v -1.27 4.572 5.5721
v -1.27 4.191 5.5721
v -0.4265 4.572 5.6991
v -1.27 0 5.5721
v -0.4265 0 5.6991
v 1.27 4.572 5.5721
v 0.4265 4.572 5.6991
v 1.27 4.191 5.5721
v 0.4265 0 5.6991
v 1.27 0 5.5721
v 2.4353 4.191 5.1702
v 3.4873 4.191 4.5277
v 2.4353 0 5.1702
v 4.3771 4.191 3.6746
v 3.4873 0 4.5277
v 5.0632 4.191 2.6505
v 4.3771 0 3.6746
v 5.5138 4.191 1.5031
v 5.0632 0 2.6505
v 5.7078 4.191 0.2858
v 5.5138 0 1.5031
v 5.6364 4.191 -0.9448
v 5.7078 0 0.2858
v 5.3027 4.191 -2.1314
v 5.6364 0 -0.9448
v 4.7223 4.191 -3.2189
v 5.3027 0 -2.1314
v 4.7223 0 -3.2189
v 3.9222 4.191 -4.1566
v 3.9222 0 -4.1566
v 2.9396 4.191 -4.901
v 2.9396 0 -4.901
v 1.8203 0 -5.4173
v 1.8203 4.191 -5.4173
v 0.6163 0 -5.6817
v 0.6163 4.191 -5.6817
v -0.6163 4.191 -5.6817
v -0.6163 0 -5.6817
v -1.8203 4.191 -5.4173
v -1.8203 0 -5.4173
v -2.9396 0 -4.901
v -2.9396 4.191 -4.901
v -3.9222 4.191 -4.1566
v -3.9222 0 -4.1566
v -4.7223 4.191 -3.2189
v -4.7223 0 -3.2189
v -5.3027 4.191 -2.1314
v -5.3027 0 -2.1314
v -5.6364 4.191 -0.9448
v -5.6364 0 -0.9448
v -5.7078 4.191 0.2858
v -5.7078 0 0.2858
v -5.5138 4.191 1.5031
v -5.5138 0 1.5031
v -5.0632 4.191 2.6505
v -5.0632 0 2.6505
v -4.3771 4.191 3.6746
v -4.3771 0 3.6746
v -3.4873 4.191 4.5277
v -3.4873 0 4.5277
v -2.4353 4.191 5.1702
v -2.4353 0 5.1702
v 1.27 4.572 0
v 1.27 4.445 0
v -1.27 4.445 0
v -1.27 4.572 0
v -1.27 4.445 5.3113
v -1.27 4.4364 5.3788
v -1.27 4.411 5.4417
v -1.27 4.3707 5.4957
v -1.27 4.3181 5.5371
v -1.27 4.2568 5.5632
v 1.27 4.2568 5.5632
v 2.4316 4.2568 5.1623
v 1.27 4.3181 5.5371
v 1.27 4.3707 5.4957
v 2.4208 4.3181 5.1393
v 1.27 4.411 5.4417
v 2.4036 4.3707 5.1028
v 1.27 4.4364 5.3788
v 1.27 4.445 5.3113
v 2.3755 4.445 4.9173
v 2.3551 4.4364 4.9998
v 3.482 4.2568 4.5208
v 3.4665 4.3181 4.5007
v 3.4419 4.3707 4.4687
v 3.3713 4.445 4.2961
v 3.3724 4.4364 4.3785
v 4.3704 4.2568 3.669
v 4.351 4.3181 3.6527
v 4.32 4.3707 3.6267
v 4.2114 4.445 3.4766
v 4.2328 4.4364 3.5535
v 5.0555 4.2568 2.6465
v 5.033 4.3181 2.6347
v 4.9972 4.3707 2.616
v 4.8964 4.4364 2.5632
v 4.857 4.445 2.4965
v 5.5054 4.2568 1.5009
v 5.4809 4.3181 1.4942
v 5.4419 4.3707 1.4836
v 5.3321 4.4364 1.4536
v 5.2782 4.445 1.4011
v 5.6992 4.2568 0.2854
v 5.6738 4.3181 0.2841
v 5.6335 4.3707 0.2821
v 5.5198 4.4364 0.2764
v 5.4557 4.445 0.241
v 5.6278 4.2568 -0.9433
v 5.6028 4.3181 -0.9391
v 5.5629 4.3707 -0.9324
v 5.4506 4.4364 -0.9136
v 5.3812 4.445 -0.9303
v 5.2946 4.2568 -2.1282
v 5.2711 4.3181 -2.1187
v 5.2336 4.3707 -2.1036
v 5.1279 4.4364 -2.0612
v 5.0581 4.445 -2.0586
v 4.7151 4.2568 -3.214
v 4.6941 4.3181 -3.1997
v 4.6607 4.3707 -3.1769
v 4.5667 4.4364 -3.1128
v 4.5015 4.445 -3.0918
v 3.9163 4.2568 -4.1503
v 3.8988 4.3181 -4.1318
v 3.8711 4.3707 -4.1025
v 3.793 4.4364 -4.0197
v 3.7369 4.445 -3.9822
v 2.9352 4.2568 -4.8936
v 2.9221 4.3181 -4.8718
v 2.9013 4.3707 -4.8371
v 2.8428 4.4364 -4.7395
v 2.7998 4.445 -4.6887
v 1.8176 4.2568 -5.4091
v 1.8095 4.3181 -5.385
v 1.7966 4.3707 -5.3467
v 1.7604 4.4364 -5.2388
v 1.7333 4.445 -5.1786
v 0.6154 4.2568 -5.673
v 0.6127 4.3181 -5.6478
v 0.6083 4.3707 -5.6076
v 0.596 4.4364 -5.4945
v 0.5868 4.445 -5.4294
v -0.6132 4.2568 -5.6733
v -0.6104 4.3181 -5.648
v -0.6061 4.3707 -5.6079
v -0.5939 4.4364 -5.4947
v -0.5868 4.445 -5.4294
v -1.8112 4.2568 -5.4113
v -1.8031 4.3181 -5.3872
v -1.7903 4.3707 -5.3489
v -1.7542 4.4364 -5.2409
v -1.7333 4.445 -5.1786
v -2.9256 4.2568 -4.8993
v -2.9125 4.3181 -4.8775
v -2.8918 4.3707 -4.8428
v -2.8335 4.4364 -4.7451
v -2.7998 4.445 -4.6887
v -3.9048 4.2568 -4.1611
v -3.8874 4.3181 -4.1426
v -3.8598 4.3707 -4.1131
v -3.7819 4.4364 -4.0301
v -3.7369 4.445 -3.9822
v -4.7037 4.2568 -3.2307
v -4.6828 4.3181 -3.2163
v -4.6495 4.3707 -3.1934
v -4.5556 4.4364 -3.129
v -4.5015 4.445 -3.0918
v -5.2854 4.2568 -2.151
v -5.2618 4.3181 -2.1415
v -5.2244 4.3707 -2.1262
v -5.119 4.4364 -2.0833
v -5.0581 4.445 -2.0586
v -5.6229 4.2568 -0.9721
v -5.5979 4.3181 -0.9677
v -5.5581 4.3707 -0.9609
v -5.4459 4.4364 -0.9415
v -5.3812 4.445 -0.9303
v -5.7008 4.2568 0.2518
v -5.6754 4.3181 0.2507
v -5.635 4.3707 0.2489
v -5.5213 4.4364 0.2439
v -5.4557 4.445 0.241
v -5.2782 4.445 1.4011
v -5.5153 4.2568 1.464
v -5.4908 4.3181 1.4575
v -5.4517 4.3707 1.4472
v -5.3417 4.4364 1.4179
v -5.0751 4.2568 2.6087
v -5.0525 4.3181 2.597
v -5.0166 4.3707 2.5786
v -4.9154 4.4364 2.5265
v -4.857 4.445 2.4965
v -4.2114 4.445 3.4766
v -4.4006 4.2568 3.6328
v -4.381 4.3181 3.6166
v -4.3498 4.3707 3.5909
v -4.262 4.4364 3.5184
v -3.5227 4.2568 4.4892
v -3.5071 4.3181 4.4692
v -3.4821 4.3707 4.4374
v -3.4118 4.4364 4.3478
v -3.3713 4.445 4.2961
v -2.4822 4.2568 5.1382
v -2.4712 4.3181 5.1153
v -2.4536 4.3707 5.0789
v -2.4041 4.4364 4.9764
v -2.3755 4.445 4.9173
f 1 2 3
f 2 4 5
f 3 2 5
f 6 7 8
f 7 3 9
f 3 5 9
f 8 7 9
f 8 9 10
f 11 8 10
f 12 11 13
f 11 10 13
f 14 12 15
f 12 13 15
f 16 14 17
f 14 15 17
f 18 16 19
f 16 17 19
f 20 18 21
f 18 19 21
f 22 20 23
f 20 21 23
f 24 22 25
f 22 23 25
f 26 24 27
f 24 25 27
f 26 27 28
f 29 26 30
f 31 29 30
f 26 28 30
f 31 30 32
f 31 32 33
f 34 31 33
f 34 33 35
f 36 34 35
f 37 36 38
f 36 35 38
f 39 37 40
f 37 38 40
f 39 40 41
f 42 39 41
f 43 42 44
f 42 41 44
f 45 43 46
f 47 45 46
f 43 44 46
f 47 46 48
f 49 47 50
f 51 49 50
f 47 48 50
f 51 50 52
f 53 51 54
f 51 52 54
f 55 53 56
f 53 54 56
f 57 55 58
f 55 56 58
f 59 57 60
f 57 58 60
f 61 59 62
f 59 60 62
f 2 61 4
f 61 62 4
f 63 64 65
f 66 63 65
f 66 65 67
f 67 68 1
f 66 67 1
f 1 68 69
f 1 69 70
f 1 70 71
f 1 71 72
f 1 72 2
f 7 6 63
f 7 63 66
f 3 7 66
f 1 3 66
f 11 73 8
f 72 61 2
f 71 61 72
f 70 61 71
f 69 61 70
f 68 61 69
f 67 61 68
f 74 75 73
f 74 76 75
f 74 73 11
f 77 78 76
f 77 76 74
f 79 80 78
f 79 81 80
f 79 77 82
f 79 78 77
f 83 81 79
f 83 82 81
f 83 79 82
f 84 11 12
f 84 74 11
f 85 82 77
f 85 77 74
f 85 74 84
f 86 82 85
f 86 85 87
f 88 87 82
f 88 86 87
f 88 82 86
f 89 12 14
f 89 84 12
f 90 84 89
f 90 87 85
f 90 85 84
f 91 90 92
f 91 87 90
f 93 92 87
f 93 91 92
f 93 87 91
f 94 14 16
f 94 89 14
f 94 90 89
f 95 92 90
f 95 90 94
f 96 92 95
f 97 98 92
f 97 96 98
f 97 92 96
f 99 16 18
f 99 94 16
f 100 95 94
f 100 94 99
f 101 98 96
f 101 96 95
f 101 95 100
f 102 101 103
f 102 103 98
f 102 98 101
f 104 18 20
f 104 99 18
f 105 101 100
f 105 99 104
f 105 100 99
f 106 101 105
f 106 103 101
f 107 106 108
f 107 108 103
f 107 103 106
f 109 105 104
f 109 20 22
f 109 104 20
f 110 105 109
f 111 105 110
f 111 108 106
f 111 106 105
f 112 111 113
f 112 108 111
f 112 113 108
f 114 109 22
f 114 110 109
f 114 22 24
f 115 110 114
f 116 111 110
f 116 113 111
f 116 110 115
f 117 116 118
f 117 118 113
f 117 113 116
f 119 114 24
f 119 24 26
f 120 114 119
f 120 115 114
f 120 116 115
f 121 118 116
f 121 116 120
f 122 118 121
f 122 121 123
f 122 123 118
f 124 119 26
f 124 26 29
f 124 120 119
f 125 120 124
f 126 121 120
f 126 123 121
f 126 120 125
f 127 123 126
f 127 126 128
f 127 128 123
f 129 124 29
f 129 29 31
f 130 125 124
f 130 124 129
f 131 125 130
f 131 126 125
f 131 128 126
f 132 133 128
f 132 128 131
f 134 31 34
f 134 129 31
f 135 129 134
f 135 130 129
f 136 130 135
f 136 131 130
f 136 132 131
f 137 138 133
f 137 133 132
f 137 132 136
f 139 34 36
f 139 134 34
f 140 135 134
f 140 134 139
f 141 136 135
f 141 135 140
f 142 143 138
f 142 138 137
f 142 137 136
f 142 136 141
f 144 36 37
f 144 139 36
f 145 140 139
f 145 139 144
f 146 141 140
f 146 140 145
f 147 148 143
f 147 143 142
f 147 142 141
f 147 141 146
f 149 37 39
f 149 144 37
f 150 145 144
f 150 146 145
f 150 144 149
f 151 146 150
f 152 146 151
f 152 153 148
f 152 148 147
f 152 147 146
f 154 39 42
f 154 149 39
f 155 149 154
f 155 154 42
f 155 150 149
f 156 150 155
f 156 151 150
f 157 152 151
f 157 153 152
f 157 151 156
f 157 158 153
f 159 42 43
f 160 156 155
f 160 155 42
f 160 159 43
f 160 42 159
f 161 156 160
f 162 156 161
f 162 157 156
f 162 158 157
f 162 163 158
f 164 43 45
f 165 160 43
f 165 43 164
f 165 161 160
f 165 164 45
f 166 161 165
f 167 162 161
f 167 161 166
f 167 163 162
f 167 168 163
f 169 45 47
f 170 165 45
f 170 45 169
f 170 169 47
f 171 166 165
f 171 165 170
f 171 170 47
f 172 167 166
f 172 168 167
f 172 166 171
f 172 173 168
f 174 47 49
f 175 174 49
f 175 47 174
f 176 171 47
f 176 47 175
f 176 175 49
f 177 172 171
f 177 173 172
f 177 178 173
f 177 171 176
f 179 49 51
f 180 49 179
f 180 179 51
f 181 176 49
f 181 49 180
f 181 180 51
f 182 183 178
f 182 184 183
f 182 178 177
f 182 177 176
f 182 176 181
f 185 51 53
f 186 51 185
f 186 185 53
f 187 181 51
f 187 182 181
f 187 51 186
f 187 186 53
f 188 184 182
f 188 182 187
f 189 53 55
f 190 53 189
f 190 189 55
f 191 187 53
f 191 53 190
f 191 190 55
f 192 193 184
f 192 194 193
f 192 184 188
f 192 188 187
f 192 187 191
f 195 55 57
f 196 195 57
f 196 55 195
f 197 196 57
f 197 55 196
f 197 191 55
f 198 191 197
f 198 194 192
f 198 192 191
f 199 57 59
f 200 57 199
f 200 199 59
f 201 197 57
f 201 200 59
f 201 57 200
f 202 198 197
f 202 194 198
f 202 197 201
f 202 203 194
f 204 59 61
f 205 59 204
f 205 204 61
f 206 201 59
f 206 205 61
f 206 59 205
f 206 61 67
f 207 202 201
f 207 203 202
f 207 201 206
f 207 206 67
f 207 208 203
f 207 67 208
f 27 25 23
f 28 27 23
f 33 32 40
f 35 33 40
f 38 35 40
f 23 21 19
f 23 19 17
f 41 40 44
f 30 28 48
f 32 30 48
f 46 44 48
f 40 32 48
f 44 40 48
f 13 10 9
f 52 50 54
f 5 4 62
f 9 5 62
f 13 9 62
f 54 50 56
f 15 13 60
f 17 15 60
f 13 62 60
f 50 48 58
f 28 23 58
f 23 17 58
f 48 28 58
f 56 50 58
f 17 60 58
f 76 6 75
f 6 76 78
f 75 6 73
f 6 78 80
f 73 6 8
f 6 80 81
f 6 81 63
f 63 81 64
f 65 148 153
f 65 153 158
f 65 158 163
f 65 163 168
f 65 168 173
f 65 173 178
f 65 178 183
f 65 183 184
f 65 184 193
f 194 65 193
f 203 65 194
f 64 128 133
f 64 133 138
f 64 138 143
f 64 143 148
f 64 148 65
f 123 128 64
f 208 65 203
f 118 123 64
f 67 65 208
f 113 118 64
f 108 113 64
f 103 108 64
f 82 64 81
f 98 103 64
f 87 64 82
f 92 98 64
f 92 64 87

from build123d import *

# Parameters (mm, degrees)
SKETCH1_R           = 5.715
BOSS_EXTRUDE1_DEPTH = 4.445
FILLET2_R           = 0.254
SKETCH2_W           = 2.54
SKETCH2_H           = 5.715
CUT_EXTRUDE1_DEPTH  = 10.223907794
BOSS_EXTRUDE2_DEPTH = 4.572


with BuildPart() as part:
    # Sketch1 → Boss-Extrude1 (new body)
    with BuildSketch(Plane(origin=(0, 0, 0), x_dir=(1, 0, 0), z_dir=(0, 1, 0))):
        with Locations(Location((0, 0, 0), (0, 0, 270))):
            Circle(SKETCH1_R)
    extrude(amount=BOSS_EXTRUDE1_DEPTH)

    # Fillet2
    fillet2_edges = [part.edges().sort_by_distance(p)[0] for p in [
        (0, 4.445, -5.715),
    ]]
    fillet(fillet2_edges, radius=FILLET2_R)

    # Sketch2 → Cut-Extrude1 (cut, through all)
    with BuildSketch(Plane.XZ):
        with Locations((0, 2.8575)):
            Rectangle(SKETCH2_W, SKETCH2_H)
    extrude(amount=-CUT_EXTRUDE1_DEPTH, mode=Mode.SUBTRACT)

    # Sketch3 → Boss-Extrude2 (add)
    with BuildSketch(Plane.XZ):
        with BuildLine():
            Line((-1.27, 0), (-1.27, 5.572102386))
            ThreePointArc((-1.27, 5.572102386), (0, 5.715), (1.27, 5.572102386))
            Line((1.27, 5.572102386), (1.27, 0))
            Line((1.27, 0), (-1.27, 0))
        make_face()
    extrude(amount=-BOSS_EXTRUDE2_DEPTH)


solid = part.part
